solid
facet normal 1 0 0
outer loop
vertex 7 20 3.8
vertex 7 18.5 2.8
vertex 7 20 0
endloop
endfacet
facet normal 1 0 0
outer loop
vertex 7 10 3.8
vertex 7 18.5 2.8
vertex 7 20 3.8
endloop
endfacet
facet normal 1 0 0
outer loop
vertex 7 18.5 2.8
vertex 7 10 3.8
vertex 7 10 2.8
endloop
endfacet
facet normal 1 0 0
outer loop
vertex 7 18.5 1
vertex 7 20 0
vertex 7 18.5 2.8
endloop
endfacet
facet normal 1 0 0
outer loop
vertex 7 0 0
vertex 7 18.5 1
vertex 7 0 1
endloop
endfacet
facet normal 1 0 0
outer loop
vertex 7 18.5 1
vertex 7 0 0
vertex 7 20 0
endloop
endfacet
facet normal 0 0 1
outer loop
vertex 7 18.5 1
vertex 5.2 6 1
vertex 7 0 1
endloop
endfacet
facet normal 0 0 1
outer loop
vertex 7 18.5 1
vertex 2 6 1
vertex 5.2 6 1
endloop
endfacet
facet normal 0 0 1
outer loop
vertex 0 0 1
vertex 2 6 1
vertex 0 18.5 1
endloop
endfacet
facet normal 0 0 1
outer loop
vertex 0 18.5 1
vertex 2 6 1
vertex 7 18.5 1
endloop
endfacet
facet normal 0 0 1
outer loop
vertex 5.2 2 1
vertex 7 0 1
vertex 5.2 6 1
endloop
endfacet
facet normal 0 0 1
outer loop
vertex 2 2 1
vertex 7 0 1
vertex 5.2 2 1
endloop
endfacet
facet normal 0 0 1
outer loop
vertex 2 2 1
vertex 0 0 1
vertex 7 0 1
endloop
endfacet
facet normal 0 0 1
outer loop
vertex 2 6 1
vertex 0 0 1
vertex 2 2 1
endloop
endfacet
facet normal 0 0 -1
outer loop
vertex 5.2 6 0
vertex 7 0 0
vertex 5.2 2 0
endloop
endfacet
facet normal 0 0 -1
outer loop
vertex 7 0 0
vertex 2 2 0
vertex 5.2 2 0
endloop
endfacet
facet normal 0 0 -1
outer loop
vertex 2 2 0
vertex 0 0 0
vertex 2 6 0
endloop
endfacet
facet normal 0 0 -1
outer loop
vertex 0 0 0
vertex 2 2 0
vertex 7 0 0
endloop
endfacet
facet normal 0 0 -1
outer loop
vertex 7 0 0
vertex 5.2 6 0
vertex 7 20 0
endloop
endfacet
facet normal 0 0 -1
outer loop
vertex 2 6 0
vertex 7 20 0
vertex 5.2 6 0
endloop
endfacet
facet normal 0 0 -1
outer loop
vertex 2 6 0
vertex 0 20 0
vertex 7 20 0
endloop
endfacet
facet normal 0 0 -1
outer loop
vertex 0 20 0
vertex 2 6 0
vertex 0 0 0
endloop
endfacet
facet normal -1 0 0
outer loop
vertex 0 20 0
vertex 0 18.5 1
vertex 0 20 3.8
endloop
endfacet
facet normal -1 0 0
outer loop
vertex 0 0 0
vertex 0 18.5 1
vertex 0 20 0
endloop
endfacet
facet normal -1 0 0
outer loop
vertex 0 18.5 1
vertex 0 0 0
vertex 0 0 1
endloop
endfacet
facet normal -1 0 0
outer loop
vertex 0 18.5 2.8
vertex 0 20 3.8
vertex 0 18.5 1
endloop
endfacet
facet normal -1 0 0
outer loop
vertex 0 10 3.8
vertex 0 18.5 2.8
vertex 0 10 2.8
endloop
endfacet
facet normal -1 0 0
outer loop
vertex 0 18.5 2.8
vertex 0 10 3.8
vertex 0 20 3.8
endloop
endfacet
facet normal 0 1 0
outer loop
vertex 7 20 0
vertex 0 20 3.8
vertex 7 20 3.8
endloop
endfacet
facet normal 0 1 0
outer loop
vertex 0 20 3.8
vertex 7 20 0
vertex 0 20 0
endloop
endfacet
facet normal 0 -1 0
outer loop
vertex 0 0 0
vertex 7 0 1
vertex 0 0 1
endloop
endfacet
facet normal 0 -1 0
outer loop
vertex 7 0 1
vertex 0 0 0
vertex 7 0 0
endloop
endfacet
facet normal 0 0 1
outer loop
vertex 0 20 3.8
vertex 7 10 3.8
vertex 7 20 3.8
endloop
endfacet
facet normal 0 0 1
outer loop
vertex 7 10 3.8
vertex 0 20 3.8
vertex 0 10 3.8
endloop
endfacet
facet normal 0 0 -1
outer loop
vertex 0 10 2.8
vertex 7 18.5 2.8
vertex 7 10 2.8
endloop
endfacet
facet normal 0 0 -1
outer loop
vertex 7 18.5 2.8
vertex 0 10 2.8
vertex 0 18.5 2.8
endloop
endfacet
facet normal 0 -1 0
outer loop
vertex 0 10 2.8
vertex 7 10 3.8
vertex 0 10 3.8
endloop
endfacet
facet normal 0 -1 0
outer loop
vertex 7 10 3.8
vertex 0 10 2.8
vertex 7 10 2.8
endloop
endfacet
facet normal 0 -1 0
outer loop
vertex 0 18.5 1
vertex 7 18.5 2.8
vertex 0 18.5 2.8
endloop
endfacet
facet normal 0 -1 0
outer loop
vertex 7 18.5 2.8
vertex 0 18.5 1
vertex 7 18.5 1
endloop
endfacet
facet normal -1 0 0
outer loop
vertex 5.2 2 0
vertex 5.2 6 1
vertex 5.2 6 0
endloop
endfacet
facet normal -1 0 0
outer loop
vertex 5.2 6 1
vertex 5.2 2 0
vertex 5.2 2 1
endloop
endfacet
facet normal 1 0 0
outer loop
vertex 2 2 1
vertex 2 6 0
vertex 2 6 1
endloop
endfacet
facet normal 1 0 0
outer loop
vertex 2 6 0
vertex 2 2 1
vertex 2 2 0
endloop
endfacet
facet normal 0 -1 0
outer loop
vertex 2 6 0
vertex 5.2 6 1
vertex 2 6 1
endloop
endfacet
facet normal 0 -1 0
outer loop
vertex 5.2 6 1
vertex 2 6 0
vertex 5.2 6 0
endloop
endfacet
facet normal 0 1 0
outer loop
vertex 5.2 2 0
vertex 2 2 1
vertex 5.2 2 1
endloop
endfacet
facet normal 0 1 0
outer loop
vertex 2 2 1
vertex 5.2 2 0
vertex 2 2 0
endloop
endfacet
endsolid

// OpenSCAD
difference() {
	union() {
		cube([7,20,1]);
		translate([0,10,2.8]) cube([7,10,1]);
		translate([0,18.5,0]) cube([7,1.5,3]);
	}
	translate([2, 2, -0.01]) cube([3.2, 4, 3.1]);
}
